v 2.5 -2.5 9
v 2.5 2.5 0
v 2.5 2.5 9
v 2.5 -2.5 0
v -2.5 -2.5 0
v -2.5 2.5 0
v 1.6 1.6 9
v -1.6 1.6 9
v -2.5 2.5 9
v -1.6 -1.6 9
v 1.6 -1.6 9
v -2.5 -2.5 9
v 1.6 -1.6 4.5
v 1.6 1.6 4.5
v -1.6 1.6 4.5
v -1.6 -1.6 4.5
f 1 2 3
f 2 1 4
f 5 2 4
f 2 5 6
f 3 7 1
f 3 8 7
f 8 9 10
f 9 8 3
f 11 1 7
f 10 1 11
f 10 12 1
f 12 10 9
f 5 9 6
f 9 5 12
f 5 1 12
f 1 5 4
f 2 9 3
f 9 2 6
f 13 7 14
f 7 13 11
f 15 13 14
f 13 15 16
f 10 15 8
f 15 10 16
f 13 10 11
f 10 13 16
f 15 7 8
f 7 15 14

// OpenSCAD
include <Diapasonix.scad>

module navigation_switch_cap(){
    difference(){
        
        translate([-nav_switch_side/2, -nav_switch_side/2, 0]) 
        cube([nav_switch_side, nav_switch_side, nav_switch_height]);
    
        translate([-nav_switch_cutout_size/2, -nav_switch_cutout_size/2, 0])
        cube([nav_switch_cutout_size, nav_switch_cutout_size, nav_switch_cutout_depth]);
    }
}

if(is_undef(is_root)) {
    translate([0,0,nav_switch_height])
    rotate([180,0,0])
    navigation_switch_cap();
}
